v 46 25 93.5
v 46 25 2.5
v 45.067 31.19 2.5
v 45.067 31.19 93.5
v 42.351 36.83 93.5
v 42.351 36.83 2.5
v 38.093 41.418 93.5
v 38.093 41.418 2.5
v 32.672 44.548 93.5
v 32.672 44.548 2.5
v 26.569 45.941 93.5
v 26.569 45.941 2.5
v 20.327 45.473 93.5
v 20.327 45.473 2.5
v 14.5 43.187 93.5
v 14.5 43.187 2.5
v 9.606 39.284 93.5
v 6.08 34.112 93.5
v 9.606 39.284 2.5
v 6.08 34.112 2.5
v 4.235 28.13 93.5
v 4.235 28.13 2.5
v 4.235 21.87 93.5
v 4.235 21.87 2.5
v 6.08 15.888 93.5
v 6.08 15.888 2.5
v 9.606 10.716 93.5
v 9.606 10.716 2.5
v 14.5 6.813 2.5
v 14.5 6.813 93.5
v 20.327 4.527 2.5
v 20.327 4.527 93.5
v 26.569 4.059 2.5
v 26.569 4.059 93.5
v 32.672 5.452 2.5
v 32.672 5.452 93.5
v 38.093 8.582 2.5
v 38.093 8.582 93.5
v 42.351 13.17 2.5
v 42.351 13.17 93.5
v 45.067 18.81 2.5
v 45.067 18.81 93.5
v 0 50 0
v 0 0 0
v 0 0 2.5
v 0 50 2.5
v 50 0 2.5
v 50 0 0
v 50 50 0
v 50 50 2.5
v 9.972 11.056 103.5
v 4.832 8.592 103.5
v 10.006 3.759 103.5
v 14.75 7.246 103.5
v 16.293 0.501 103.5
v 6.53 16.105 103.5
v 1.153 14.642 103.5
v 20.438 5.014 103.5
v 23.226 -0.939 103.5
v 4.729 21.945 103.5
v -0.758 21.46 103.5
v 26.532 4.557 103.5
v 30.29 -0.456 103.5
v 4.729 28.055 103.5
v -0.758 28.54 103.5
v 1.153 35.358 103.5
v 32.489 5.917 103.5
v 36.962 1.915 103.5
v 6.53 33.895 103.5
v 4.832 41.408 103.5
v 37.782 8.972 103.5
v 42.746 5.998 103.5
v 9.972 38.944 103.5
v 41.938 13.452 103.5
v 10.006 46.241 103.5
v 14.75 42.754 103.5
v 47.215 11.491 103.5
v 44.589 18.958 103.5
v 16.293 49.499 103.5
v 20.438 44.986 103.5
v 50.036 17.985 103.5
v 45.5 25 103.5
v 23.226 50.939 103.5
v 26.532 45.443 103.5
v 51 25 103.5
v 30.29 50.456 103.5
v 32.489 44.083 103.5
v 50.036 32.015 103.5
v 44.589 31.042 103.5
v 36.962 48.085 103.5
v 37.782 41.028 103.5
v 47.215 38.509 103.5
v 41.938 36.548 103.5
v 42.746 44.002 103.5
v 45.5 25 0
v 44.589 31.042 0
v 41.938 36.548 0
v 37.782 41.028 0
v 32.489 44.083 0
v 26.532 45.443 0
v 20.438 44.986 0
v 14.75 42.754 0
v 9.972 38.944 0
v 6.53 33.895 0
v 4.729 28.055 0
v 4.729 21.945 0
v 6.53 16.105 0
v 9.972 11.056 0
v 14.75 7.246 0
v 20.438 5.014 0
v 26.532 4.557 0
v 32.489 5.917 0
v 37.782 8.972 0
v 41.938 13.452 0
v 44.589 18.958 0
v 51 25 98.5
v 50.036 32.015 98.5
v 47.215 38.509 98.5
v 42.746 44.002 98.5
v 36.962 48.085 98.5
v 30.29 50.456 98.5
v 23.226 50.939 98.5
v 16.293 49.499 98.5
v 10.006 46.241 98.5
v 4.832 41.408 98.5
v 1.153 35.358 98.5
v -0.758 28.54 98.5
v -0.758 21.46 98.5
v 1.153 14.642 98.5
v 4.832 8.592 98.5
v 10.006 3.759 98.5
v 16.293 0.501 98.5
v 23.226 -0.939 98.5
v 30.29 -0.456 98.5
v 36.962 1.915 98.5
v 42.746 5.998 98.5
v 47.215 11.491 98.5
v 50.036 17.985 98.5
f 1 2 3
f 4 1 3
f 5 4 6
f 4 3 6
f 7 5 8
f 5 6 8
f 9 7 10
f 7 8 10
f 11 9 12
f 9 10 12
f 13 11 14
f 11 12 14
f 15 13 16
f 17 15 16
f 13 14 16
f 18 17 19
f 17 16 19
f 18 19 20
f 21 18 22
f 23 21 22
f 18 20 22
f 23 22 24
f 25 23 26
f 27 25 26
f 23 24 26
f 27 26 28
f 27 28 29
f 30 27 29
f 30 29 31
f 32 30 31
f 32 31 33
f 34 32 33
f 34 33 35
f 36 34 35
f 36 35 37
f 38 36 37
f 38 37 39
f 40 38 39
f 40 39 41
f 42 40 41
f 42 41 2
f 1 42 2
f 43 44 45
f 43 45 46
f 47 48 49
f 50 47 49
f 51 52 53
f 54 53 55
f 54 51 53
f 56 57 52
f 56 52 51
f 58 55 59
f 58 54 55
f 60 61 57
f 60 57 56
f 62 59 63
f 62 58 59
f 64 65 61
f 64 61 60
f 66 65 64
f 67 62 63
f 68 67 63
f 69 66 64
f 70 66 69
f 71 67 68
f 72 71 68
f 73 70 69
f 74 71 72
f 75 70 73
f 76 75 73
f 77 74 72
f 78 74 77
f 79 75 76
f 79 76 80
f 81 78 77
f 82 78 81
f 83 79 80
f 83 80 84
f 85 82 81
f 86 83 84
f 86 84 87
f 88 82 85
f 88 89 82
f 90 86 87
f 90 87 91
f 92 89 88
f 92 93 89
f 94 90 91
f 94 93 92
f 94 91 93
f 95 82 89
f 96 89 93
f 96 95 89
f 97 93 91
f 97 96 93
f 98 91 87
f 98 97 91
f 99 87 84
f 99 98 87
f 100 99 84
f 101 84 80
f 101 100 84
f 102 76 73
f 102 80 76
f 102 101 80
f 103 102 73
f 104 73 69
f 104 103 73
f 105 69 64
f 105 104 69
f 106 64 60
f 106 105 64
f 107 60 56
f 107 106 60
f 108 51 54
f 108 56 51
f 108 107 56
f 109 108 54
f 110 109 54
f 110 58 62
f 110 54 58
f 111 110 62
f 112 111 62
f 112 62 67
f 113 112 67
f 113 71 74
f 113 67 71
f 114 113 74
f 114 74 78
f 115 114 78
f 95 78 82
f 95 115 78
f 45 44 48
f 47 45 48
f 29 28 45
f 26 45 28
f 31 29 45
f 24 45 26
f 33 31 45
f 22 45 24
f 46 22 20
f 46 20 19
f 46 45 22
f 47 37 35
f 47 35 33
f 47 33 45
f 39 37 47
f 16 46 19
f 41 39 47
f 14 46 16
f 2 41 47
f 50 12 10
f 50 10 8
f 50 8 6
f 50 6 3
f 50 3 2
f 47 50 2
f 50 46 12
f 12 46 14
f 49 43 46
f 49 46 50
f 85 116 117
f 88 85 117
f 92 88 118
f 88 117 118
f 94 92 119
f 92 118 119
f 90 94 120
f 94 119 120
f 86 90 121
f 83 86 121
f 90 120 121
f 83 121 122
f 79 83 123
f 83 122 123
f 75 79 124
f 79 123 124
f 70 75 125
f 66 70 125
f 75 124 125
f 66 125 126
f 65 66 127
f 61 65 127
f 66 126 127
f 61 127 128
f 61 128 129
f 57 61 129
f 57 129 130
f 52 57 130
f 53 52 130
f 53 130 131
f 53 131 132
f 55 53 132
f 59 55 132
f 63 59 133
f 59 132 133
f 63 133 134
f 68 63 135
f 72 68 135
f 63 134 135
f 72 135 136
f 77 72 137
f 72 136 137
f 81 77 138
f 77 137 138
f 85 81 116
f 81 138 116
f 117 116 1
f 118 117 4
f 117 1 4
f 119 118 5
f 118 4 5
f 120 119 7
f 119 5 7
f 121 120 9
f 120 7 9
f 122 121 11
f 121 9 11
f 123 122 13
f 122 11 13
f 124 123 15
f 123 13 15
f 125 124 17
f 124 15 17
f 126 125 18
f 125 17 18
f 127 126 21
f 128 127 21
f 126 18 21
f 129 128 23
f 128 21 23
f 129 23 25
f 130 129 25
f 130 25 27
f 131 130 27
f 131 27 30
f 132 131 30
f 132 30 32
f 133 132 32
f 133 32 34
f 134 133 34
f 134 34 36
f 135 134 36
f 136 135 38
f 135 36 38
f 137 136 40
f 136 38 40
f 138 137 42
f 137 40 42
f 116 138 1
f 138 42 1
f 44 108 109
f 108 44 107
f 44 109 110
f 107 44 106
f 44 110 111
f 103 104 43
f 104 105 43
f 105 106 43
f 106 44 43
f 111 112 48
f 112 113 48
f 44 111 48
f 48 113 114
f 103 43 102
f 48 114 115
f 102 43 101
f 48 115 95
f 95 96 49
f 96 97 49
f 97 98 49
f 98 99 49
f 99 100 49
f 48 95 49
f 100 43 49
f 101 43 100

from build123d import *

# Parameters (mm, degrees)
CYLINDER_R        = 20.5
CYLINDER_DEPTH    = 120
CYLINDER002_R     = 26
CYLINDER002_DEPTH = 10
CHAMFER_SIZE      = 5
CYLINDER001_R     = 21
CYLINDER001_DEPTH = 100
BOX_W             = 50
BOX_H             = 50
BOX_DEPTH         = 2.5


with BuildPart() as cylinder:
    # Cylinder → Cylinder (new body)
    with BuildSketch(Plane(origin=(25, 25, 0), x_dir=(1, 0, 0), z_dir=(0, 0, 1))):
        Circle(CYLINDER_R)
    extrude(amount=CYLINDER_DEPTH)


with BuildPart() as chamfer_body:
    # Cylinder002 → Cylinder002 (new body)
    with BuildSketch(Plane(origin=(25, 25, 93.5), x_dir=(1, 0, 0), z_dir=(0, 0, 1))):
        Circle(CYLINDER002_R)
    extrude(amount=CYLINDER002_DEPTH)

    # Chamfer
    chamfer_edges = [chamfer_body.edges().sort_by_distance(p)[0] for p in [
        (-1, 25, 93.5),
    ]]
    chamfer(chamfer_edges, length=CHAMFER_SIZE)


with BuildPart() as fusion:
    # Cylinder001 → Cylinder001 (new body)
    with BuildSketch(Plane(origin=(25, 25, 0), x_dir=(1, 0, 0), z_dir=(0, 0, 1))):
        Circle(CYLINDER001_R)
    extrude(amount=CYLINDER001_DEPTH)

    # Fusion: union Chamfer body
    add(chamfer_body.part)


with BuildPart() as cut:
    # Box → Box (new body)
    with BuildSketch(Plane.XY):
        with Locations((25, 25)):
            Rectangle(BOX_W, BOX_H)
    extrude(amount=BOX_DEPTH)

    # Fusion001: union Fusion
    add(fusion.part)

    # Cut: cut Cylinder
    add(cylinder.part, mode=Mode.SUBTRACT)


solid = cut.part
